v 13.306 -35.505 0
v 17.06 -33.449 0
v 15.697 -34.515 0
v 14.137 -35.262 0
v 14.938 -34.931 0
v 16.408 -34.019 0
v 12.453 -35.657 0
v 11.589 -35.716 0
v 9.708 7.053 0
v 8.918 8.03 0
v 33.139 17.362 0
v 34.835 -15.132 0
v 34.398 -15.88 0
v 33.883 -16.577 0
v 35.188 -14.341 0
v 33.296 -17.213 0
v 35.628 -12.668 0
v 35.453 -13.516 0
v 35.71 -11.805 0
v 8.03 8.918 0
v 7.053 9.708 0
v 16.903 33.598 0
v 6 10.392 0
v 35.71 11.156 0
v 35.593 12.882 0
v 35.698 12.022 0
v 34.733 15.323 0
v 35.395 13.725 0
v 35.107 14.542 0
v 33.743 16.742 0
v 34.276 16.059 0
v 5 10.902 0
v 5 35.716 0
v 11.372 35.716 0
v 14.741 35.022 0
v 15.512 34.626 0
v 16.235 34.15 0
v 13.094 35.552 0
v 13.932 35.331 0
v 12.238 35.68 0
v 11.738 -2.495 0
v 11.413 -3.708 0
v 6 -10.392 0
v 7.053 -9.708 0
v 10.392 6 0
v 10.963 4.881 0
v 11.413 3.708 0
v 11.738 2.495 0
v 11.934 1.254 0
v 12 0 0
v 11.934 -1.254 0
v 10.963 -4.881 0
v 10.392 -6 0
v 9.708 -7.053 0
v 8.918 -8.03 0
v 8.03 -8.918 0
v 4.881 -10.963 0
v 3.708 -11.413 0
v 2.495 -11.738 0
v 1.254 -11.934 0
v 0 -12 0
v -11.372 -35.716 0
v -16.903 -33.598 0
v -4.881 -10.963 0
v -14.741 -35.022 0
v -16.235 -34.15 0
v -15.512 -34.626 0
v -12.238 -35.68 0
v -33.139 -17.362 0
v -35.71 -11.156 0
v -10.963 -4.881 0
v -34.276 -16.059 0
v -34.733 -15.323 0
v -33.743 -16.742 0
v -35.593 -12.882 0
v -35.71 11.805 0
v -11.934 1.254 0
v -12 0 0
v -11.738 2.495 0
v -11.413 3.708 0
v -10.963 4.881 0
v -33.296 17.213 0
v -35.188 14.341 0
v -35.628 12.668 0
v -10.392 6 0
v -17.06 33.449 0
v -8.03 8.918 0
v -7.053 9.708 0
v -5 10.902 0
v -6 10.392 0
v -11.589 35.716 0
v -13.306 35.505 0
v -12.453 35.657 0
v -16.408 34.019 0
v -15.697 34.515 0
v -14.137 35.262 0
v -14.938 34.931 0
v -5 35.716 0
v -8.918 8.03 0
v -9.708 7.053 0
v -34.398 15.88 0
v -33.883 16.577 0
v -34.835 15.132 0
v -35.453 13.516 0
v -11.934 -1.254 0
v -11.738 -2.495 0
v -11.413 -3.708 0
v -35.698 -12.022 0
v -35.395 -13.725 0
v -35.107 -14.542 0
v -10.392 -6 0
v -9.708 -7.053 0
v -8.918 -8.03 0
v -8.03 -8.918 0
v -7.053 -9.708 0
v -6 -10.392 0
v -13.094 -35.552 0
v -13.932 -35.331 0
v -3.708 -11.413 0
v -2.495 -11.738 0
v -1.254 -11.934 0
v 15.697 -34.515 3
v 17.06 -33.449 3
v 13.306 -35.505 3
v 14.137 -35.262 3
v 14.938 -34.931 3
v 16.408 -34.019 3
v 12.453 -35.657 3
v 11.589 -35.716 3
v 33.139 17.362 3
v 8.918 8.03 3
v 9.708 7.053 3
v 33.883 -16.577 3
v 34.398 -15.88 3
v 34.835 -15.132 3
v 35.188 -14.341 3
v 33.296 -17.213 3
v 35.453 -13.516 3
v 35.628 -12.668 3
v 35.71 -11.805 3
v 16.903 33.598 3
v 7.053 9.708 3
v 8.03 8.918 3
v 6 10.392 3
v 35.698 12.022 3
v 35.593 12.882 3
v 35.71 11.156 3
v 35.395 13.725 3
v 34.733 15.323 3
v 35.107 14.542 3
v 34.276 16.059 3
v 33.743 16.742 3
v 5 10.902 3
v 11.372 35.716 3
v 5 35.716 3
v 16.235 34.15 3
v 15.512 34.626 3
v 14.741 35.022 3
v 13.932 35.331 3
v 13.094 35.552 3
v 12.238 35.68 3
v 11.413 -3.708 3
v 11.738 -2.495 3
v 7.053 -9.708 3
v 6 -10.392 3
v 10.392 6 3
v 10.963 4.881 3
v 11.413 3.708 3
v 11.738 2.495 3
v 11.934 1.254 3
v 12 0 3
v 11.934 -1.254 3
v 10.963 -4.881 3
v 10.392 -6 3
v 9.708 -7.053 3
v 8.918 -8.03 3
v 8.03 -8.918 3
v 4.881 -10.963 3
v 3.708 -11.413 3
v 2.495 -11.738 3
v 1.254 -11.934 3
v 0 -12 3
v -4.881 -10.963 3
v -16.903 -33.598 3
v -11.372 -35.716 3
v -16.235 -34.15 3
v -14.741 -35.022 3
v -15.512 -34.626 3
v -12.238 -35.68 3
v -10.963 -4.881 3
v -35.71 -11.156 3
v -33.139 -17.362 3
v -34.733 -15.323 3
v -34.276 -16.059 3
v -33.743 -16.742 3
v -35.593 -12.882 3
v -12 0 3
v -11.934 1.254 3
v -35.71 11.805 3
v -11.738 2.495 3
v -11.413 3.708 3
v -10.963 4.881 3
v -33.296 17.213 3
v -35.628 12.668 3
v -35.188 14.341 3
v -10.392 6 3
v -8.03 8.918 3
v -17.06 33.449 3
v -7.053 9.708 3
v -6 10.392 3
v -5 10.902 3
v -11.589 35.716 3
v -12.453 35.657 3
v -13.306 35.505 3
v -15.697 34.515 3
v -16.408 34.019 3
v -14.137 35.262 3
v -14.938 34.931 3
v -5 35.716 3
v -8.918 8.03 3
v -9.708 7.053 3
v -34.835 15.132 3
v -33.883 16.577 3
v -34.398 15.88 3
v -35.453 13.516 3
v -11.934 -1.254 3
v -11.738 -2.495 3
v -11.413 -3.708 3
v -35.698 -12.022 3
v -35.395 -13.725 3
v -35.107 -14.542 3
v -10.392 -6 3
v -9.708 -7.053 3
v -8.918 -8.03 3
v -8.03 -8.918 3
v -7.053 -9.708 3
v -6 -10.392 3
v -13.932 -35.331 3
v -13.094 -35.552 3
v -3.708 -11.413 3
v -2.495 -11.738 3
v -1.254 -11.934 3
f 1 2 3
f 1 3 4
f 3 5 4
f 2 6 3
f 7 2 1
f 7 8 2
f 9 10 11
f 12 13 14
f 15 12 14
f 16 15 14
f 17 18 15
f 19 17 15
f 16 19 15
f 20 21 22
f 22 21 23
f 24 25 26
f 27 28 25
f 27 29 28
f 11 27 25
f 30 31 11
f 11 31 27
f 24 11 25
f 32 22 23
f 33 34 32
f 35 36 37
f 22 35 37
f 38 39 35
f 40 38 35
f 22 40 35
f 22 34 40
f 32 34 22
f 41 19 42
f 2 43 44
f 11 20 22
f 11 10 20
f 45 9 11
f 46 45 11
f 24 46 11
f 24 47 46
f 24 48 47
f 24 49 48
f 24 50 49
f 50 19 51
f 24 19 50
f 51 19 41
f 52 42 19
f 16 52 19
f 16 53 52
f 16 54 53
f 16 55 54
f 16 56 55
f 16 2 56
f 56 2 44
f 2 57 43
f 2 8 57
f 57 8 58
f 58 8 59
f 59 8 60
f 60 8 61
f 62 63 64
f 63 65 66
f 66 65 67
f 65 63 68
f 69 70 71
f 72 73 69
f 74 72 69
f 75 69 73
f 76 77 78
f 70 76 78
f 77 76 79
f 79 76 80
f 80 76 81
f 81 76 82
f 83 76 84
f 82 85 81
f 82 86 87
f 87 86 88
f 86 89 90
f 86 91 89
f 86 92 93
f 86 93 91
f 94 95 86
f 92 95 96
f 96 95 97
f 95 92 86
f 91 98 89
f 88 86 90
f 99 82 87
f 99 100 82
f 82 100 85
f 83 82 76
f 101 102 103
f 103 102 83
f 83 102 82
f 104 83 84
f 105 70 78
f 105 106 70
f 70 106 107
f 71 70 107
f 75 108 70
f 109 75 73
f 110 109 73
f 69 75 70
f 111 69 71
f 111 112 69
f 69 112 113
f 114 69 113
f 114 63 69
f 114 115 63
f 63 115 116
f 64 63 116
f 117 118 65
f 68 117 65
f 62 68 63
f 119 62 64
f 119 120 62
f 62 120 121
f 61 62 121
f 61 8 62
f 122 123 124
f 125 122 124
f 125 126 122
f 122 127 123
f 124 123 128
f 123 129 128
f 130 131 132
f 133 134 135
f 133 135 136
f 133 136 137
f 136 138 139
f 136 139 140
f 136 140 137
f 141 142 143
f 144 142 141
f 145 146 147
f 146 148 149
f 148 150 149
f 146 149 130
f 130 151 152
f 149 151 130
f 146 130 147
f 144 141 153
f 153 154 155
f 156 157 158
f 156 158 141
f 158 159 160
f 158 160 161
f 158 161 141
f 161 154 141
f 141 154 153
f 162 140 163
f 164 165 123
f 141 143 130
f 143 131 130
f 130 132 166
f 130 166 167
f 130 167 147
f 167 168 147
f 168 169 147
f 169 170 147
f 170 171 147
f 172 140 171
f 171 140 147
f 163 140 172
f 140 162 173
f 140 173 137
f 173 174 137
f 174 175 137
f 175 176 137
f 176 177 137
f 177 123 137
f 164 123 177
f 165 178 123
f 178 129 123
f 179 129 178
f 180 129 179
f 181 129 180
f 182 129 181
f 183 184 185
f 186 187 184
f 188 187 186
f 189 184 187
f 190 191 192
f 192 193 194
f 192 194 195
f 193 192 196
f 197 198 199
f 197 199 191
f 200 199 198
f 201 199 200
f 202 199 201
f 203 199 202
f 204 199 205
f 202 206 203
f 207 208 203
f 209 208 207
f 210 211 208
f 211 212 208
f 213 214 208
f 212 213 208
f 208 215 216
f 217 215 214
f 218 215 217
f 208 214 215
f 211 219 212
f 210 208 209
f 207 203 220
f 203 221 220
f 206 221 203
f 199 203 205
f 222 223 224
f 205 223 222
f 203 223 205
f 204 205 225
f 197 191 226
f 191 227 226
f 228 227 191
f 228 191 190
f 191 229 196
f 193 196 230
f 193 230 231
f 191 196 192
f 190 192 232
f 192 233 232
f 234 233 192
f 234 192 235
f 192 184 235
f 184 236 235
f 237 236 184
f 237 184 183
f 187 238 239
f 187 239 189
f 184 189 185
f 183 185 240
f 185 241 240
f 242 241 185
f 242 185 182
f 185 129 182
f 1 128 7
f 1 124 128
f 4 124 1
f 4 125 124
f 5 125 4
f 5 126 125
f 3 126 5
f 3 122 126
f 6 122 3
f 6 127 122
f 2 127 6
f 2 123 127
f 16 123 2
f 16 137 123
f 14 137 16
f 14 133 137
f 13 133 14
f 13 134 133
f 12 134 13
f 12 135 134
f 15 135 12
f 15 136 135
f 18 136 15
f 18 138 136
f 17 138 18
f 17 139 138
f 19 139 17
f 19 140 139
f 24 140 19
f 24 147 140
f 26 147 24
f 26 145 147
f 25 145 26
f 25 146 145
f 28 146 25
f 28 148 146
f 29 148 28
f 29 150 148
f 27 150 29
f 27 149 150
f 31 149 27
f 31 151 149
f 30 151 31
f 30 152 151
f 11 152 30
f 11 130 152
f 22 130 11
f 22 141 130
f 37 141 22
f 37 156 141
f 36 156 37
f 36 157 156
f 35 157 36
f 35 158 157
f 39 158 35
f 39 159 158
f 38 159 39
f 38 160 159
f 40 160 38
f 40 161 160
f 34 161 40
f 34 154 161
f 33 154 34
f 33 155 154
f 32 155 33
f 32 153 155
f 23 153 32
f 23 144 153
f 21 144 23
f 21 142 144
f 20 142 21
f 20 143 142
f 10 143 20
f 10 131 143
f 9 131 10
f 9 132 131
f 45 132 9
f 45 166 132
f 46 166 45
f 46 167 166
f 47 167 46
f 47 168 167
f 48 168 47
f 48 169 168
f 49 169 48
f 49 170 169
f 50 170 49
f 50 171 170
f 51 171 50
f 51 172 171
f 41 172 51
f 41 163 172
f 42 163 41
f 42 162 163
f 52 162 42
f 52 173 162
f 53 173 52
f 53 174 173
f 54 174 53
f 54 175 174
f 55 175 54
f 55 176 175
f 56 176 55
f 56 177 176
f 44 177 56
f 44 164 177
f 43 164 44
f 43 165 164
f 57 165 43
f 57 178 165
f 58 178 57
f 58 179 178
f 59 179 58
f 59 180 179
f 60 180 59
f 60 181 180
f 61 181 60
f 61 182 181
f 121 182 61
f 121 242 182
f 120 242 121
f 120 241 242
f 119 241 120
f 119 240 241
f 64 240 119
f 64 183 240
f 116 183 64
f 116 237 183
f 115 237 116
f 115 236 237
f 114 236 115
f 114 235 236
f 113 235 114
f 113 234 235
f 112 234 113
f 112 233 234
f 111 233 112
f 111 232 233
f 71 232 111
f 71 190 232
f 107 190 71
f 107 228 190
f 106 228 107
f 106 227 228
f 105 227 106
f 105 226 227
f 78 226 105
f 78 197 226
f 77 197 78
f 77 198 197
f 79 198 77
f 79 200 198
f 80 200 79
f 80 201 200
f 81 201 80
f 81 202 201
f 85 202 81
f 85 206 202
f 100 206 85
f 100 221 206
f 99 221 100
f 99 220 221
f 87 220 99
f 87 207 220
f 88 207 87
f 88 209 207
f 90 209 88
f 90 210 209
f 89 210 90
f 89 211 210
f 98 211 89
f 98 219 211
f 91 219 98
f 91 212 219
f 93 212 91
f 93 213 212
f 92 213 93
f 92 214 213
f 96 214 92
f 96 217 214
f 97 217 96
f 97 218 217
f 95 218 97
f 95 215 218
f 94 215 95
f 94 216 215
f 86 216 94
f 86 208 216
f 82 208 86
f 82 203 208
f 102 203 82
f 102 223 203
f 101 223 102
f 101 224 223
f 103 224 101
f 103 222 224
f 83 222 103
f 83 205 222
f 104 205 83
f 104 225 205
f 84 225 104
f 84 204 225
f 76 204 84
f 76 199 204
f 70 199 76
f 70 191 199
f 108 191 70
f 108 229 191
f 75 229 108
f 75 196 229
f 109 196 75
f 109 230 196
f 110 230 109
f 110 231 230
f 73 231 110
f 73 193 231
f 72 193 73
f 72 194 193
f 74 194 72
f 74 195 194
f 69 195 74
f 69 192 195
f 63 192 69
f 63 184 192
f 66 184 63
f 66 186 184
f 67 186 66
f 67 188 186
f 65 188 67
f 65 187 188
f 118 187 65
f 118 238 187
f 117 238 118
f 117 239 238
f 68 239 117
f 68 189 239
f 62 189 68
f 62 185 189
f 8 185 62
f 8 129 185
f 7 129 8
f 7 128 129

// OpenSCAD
// file: coaster_lib.scad
$fa = 6;
$fs = 0.875;

module coaster_base_3d(size, thickness, border_radius) {
    linear_extrude(height = thickness) {
        minkowski() {
            cube_size = size - border_radius * 2;

            square(size = [cube_size, cube_size], center = true);
            circle(r = border_radius);
        }
    }
}

module epayslips_logo_2d(size) {
    difference() {
        rotate(a = 45)
        minkowski() {
            roundness = 22;
            cube_size = size * 0.5 - roundness;

            square(size = [cube_size, cube_size], center = true);
            circle(r = roundness);
        }

        minkowski() {
            roundness = 10;
            cube_size = size * 0.25 - roundness;

            square(size = [cube_size, cube_size], center = true);
            circle(r = roundness);
        }
    }
}

module datacode_logo_2d(size) {
    difference() {
        rotate(a = 45 / 2)
        minkowski() {
            roundness = 8;
            circle(r = size * 0.38 - roundness, $fn = 8);
            circle(r = roundness);
        }

        circle(r = size * 0.12);

        translate([0, size / 4, 0]) {
            square(size = [size * 0.1, size / 2], center = true);
        }
    }
}

module sj_logo_2d(size) {
    rotate(a = 45 / 2)
    difference() {
        roundness = 8;

        minkowski() {
            circle(r = size * 0.45 - roundness, $fn = 8);
            circle(r = roundness);
        }

        minkowski() {
            circle(r = size * 0.385 - roundness, $fn = 8);
            circle(r = roundness);
        }
    }

    text_size = size * 0.2;
    text_offset = text_size / 2 + 2;

    translate([0, text_offset, 0])
    text(
        text = "JAC",
        halign = "center",
        valign = "center",
        font = "Roboto Mono for Powerline:style=Bold",
        size = size * 0.2
    );

    translate([0, -text_offset, 0])
    text(
        text = "UZI",
        halign = "center",
        valign = "center",
        font = "Roboto Mono for Powerline:style=Bold",
        size = size * 0.2
    );
}
// main file
include<coaster_lib.scad>;

$fa = 6;
$fs = 0.875;

size = 100;
border_radius = 14;
thickness = 6;

linear_extrude(height = thickness / 2) {
    datacode_logo_2d(size);
}
